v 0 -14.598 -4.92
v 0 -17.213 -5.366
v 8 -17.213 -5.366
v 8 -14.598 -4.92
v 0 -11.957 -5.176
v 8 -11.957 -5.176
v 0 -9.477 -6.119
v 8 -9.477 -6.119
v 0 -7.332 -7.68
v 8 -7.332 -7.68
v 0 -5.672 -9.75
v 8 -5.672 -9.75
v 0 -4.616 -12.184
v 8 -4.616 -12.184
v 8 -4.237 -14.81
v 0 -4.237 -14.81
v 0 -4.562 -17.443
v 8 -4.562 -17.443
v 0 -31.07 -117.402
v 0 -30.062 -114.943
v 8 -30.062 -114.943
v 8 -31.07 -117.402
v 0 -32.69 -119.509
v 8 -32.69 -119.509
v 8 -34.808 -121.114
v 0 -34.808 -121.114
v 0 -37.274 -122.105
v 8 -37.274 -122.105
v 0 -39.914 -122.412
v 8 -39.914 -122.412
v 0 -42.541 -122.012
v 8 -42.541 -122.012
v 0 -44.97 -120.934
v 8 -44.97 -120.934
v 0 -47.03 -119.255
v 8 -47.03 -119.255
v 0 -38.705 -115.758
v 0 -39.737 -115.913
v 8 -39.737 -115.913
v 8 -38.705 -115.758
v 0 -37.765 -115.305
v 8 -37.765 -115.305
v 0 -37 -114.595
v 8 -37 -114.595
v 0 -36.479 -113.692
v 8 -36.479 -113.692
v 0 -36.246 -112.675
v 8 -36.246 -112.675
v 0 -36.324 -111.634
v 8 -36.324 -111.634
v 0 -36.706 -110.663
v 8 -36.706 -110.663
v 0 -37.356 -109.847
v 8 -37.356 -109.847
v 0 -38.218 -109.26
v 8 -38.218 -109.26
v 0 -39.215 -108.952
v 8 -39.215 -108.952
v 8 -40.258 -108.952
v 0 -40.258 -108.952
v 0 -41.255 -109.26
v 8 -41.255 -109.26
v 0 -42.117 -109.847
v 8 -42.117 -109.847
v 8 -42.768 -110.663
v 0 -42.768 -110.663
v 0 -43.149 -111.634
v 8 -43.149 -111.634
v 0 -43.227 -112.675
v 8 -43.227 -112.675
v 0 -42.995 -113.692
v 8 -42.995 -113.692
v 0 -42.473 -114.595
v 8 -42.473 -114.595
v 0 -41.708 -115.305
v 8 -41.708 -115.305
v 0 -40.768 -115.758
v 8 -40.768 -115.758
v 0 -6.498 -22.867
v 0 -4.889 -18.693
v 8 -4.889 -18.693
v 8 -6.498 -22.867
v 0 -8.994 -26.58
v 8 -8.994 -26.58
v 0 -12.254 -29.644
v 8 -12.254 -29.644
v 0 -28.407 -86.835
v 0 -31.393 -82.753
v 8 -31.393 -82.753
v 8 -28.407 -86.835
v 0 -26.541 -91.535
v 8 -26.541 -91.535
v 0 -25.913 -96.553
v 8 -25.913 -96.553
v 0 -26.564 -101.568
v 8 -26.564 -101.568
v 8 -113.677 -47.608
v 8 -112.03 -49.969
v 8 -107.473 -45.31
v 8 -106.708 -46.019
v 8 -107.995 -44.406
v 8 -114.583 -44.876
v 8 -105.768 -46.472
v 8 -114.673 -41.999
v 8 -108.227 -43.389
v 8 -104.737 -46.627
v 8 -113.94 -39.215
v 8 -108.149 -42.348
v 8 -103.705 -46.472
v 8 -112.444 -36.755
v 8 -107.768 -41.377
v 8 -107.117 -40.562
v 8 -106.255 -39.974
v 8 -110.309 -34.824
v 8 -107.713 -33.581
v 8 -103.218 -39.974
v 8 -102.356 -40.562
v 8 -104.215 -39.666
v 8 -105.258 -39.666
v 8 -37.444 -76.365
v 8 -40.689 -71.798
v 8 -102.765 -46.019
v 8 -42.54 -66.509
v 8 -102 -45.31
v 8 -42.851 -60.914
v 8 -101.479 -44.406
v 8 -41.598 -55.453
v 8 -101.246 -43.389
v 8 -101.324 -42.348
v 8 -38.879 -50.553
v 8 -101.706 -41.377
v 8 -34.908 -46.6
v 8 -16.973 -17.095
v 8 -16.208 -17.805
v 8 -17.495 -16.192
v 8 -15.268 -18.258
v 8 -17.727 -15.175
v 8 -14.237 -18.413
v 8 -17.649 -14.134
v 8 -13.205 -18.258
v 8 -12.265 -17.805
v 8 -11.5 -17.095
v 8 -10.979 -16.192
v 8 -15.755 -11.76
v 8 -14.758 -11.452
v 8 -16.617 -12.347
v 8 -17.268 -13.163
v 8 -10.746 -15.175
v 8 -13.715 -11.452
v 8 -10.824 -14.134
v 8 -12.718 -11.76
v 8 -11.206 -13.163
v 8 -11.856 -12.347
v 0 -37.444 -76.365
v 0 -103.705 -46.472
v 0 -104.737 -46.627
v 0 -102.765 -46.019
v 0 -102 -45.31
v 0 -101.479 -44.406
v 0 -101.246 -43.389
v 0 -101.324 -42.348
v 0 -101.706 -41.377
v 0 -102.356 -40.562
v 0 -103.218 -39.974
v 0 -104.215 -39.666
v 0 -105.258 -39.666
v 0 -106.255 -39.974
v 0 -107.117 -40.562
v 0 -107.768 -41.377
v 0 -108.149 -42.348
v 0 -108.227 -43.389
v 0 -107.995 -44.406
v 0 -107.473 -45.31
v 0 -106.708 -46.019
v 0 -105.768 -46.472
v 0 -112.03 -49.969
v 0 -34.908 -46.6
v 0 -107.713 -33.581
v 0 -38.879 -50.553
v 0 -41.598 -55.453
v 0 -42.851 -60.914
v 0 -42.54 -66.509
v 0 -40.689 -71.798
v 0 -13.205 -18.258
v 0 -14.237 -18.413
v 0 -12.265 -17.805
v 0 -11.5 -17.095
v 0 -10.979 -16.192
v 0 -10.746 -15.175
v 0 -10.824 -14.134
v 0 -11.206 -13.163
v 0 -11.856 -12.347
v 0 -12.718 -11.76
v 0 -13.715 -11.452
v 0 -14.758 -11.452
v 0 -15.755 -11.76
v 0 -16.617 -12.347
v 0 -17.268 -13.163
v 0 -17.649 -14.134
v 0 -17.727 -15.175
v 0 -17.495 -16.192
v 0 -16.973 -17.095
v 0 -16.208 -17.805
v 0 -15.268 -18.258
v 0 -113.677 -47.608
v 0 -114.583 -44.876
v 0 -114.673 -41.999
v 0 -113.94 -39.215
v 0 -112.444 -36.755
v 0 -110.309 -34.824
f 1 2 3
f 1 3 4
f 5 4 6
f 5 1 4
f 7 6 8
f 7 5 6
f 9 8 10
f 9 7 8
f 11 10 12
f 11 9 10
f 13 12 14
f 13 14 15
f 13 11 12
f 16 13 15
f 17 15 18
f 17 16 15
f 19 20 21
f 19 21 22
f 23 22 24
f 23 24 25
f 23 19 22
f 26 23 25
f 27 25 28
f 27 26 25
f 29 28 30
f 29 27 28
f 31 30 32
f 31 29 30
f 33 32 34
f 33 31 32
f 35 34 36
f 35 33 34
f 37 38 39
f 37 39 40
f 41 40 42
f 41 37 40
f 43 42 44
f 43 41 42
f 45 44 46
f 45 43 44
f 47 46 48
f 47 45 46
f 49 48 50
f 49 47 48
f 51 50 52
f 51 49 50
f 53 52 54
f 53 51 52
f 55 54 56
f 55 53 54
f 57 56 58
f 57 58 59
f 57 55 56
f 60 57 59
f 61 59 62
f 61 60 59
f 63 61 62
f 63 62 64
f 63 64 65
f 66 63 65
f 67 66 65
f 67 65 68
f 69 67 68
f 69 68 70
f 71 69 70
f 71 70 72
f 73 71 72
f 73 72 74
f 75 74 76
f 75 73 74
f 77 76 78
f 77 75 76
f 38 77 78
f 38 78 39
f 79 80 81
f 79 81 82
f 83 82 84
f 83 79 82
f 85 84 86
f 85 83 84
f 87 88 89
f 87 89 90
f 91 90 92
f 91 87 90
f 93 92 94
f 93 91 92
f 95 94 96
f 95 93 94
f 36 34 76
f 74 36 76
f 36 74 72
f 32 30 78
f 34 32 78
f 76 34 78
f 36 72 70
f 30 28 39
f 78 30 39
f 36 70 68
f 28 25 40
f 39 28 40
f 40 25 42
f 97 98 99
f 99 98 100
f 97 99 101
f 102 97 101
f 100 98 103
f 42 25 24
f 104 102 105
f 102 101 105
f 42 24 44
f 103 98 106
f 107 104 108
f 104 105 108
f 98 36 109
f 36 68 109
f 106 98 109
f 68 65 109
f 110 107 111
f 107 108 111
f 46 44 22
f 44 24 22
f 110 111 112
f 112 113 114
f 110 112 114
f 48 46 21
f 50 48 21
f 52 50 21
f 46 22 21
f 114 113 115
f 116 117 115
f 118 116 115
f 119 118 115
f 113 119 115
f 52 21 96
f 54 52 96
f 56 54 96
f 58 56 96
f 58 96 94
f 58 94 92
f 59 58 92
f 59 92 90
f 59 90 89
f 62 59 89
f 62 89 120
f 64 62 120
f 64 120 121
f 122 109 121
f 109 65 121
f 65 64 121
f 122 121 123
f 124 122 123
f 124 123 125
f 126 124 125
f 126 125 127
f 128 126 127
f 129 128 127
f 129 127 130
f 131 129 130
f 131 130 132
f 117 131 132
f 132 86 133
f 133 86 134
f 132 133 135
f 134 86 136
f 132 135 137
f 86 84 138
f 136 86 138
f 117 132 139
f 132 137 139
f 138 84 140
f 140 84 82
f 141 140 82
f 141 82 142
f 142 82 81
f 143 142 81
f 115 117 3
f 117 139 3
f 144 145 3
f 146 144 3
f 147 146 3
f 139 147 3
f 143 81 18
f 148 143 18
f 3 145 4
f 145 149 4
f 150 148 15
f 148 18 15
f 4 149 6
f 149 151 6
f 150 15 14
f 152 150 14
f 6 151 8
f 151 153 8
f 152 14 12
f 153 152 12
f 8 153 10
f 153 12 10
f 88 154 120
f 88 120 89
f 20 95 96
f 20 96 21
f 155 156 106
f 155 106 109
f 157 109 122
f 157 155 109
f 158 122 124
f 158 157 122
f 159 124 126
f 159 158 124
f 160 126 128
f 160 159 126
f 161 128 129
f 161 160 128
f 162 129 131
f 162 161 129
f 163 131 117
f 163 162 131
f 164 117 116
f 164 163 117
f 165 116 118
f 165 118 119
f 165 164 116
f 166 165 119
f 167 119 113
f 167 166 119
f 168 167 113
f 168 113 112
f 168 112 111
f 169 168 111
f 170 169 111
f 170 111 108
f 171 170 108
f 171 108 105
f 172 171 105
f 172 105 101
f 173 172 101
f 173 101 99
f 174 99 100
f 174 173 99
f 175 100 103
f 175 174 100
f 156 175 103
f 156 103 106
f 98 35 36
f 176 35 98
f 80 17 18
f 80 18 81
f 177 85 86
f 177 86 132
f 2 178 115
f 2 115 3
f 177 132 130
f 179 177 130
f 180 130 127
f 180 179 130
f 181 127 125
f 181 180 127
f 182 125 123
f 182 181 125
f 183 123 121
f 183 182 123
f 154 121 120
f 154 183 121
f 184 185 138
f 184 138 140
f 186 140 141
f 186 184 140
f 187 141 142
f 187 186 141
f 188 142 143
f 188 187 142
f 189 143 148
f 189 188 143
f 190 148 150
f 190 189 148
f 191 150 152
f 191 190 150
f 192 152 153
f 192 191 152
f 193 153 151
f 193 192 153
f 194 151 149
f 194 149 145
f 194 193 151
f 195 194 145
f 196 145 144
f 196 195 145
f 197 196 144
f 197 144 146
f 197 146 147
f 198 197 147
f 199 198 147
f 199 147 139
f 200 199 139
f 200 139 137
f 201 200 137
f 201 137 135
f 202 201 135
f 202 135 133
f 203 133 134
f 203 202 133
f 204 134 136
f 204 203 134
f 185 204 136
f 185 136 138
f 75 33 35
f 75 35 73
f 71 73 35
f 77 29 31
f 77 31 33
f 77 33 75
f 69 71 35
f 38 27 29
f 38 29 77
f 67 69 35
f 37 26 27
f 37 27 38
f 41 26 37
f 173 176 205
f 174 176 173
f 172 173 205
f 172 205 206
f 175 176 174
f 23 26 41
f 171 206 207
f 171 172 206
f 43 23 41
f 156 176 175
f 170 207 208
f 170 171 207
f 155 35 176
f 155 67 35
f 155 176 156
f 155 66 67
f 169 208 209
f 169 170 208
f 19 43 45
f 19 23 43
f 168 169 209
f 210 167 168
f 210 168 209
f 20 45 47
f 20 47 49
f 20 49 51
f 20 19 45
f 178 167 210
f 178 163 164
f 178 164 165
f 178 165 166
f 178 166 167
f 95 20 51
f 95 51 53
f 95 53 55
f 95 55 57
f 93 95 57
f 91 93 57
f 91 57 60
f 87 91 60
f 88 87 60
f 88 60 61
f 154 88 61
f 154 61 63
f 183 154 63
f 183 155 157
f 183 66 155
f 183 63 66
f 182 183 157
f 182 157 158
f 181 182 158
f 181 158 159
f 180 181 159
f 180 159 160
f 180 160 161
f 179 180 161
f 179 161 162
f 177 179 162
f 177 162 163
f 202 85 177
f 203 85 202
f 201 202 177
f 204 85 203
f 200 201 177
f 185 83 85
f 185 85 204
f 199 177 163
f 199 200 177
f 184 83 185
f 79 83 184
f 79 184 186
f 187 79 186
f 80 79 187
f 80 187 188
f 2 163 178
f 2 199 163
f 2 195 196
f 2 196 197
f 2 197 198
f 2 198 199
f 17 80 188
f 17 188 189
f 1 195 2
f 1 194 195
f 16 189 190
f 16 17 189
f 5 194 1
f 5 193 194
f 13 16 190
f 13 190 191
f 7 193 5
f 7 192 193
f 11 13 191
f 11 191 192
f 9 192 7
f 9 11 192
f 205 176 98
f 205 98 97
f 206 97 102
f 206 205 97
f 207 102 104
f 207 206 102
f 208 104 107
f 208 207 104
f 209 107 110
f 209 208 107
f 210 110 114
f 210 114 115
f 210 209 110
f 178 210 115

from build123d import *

# Parameters (mm, degrees)
SCHIZZO2_R                   = 3.5
ESTRUSIONE_ESTRUSIONE1_DEPTH = 8


with BuildPart() as part:
    # Schizzo2 → Estrusione-Estrusione1 (new body)
    with BuildSketch(Plane(origin=(0, 0, 0), x_dir=(0, 0, -1), z_dir=(1, 0, 0))):
        with BuildLine():
            Line((17.443402623, -4.562120686), (18.692856186, -4.888900849))
            ThreePointArc((18.692856186, -4.888900849), (24.793396334, -7.641998704), (29.6440016, -12.25369757))
            Line((29.6440016, -12.25369757), (46.600035601, -34.907756452))
            ThreePointArc((46.600035601, -34.907756452), (60.913978484, -42.85118293), (76.365363597, -37.443624966))
            Line((76.365363597, -37.443624966), (82.753482475, -31.392779069))
            ThreePointArc((82.753482475, -31.392779069), (91.534986316, -26.540938387), (101.567665057, -26.563850861))
            Line((101.567665057, -26.563850861), (114.943402623, -30.062120686))
            ThreePointArc((114.943402623, -30.062120686), (122.105106749, -37.2738887), (119.255032306, -47.029742304))
            Line((119.255032306, -47.029742304), (49.969227683, -112.029742304))
            ThreePointArc((49.969227683, -112.029742304), (40.580232317, -114.406888859), (33.580509124, -107.713015918))
            Line((33.580509124, -107.713015918), (5.366313747, -17.213015918))
            ThreePointArc((5.366313747, -17.213015918), (7.679922234, -7.331584183), (17.443402623, -4.562120686))
        make_face()
        with Locations((14.913125179, -14.236710913)):
            Circle(SCHIZZO2_R, mode=Mode.SUBTRACT)
        with Locations((112.413125179, -39.736710913)):
            Circle(SCHIZZO2_R, mode=Mode.SUBTRACT)
        with Locations((43.127320556, -104.736710913)):
            Circle(SCHIZZO2_R, mode=Mode.SUBTRACT)
    extrude(amount=ESTRUSIONE_ESTRUSIONE1_DEPTH)


solid = part.part
